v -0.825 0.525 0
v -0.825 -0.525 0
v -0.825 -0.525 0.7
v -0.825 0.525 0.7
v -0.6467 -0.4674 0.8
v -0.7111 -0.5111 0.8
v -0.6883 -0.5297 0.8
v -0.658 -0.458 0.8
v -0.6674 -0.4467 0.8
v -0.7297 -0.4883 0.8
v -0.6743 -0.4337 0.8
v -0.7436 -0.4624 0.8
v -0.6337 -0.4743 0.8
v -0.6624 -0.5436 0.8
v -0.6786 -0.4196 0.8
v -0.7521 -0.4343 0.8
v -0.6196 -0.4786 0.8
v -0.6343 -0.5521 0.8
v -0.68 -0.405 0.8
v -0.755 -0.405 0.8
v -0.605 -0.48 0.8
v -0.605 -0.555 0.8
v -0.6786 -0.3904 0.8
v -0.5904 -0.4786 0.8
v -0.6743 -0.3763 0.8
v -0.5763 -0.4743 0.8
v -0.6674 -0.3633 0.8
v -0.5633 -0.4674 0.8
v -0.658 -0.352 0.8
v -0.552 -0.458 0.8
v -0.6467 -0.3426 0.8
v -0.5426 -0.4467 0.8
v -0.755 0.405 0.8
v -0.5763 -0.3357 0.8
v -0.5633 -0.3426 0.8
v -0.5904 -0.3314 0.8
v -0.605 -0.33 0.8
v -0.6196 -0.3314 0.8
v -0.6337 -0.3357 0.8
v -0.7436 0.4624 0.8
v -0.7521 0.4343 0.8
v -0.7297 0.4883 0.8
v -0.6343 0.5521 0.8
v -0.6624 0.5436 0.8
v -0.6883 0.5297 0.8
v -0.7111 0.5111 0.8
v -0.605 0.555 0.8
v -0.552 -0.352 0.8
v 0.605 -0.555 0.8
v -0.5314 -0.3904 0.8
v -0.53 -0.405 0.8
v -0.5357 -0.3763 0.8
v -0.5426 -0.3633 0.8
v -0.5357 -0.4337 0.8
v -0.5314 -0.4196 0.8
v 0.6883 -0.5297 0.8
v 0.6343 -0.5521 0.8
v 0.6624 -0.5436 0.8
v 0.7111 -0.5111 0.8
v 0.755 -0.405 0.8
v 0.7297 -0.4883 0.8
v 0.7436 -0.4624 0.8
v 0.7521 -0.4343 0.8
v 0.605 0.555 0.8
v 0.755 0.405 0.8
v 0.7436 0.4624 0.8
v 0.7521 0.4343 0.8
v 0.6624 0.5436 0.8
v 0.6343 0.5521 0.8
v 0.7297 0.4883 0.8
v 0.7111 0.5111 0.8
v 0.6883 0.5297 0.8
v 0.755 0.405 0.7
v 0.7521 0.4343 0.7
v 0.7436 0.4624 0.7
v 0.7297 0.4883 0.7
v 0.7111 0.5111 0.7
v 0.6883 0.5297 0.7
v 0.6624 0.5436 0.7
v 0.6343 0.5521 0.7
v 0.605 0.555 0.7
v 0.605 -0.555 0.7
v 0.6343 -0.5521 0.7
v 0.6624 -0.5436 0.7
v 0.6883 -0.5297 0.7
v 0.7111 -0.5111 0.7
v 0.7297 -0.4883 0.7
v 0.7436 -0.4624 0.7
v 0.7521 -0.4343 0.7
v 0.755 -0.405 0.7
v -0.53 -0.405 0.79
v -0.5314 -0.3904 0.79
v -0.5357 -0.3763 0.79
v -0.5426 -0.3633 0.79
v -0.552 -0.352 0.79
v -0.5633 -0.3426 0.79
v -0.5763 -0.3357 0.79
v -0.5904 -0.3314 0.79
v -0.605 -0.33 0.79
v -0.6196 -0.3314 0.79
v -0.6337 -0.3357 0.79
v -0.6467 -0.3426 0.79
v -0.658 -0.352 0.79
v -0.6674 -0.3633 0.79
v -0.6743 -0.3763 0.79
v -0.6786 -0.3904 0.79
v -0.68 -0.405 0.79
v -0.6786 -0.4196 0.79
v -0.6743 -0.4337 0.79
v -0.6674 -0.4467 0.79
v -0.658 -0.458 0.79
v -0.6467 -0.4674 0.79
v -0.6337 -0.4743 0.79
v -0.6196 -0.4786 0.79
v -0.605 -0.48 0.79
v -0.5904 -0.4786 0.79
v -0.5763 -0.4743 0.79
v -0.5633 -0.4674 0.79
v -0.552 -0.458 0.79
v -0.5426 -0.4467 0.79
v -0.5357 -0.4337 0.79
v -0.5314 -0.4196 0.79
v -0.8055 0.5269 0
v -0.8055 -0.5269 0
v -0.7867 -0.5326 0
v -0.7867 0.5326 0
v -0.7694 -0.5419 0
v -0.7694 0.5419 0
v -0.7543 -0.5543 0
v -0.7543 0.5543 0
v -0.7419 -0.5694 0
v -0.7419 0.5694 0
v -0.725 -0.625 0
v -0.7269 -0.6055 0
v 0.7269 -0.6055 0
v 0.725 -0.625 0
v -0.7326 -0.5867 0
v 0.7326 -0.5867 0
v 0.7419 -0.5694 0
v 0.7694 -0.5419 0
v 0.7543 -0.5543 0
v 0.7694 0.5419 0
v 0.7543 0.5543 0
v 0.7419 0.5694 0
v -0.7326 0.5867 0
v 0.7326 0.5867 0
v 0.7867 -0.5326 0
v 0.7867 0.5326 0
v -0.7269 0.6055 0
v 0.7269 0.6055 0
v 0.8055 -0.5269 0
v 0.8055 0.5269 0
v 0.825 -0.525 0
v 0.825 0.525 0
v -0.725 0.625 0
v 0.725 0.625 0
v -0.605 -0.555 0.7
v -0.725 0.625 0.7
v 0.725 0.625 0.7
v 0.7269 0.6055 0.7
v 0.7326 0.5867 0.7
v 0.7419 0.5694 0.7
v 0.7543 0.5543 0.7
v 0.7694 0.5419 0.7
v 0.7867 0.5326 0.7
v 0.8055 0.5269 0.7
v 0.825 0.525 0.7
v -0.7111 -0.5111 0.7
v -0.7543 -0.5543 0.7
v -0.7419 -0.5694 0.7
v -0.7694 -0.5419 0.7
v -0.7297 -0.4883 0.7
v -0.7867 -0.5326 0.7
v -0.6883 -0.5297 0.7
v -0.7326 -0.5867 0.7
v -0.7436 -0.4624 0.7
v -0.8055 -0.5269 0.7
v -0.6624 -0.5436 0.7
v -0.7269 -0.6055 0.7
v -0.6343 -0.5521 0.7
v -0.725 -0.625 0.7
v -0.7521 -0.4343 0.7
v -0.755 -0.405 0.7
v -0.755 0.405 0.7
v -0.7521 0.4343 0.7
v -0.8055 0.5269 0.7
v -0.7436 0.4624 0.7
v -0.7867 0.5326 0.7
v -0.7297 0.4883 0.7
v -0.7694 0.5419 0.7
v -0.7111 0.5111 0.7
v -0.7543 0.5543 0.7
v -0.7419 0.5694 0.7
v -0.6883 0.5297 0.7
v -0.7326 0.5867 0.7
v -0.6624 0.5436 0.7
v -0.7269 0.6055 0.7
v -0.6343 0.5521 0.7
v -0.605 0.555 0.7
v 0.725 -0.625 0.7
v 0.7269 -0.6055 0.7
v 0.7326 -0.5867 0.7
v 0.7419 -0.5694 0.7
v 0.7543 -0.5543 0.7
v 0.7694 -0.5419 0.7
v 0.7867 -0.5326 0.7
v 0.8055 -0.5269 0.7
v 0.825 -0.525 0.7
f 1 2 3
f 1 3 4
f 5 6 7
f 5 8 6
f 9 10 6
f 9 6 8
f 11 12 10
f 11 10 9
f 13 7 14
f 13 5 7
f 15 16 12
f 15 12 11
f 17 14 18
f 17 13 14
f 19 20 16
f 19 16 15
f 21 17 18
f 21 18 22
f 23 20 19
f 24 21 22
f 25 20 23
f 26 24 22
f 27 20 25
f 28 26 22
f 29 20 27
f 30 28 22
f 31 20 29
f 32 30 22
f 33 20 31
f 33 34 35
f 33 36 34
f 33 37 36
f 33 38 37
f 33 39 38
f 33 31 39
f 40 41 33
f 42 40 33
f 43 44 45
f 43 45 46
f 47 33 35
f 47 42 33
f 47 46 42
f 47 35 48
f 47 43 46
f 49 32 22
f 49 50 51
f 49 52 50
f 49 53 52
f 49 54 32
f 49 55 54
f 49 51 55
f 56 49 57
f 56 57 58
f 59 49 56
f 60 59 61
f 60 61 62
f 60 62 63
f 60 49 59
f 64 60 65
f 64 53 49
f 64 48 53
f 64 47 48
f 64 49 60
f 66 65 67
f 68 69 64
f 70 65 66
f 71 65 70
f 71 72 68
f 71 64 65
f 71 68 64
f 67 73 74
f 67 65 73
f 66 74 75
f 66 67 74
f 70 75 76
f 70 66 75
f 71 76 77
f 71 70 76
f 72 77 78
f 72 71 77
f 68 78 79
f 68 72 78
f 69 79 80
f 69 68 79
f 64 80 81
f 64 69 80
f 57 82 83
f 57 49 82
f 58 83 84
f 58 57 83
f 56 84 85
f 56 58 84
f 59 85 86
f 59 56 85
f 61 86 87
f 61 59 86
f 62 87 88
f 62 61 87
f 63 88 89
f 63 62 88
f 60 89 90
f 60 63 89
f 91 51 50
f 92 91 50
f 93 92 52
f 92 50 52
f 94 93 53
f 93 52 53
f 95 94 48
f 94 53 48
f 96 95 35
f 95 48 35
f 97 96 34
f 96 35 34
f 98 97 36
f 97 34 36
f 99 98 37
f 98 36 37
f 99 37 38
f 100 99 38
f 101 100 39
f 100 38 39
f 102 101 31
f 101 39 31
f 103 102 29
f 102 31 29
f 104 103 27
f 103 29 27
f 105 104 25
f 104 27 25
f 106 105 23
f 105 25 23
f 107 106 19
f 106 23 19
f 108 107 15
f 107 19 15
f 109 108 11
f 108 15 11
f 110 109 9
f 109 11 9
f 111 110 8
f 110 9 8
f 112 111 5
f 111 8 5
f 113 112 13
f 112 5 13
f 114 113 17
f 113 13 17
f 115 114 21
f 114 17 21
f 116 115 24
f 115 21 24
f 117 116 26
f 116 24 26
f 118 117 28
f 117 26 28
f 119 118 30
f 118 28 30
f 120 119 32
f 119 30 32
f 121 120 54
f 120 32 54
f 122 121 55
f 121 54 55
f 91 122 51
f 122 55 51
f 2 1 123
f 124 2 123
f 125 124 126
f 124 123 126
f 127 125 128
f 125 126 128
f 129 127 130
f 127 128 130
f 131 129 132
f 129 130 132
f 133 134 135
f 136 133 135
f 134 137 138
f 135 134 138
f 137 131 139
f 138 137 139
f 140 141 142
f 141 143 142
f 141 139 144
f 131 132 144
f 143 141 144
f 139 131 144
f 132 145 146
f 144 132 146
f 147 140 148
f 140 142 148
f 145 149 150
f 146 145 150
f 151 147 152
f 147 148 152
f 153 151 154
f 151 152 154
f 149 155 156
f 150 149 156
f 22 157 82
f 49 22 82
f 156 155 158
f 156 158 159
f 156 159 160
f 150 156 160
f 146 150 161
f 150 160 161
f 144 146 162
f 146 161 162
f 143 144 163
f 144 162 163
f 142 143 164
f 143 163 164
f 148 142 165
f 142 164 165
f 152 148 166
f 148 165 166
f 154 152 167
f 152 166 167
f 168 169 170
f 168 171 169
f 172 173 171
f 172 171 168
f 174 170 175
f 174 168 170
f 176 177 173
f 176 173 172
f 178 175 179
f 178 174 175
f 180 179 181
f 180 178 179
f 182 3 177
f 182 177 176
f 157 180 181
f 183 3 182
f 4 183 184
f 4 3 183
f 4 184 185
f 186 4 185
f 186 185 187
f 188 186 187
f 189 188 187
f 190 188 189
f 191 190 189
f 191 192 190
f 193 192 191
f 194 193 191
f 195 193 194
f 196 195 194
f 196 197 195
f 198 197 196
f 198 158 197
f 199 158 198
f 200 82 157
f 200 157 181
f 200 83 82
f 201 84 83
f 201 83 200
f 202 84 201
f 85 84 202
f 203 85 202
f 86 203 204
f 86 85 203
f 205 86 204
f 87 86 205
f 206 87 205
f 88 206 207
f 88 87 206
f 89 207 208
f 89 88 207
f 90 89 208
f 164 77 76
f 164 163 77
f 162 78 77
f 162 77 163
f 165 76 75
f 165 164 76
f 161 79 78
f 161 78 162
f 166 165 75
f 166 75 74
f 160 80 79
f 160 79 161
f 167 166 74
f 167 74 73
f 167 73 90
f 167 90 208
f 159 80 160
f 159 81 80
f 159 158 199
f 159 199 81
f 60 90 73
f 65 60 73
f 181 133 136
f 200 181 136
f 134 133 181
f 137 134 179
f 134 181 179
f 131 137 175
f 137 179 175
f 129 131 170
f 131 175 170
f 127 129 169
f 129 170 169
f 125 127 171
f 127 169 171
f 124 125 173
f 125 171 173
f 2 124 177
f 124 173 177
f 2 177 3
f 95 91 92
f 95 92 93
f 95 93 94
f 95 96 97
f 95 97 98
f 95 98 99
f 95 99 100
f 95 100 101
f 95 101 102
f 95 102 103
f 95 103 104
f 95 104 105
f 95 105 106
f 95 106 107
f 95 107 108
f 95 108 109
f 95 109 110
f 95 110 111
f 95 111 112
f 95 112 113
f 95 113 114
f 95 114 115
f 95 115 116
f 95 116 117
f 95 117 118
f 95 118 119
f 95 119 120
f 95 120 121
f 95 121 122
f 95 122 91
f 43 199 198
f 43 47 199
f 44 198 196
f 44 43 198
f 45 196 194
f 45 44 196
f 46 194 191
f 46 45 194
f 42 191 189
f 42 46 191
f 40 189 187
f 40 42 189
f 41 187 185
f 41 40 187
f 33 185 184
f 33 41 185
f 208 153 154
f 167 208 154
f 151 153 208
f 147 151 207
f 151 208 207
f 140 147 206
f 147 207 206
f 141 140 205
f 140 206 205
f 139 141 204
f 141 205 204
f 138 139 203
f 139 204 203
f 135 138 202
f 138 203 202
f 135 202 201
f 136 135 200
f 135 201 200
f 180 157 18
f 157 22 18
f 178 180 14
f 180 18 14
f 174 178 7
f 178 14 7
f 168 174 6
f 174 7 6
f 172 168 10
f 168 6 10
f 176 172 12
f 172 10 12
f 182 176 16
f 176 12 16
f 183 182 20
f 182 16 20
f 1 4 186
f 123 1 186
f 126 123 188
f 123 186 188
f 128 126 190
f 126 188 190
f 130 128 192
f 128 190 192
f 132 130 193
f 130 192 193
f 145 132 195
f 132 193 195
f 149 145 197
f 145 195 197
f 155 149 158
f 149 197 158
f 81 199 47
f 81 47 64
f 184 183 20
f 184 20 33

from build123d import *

# Parameters (mm, degrees)
SKETCH1_W           = 1.65
SKETCH1_H           = 1.25
BOSS_EXTRUDE1_DEPTH = 0.7
SKETCH2_W           = 1.51
SKETCH2_H           = 1.11
BOSS_EXTRUDE2_DEPTH = 0.1
FILLET1_R           = 0.15
SKETCH3_R           = 0.1
CUT_EXTRUDE1_DEPTH  = 2.2494999
SKETCH4_R           = 0.075
CUT_EXTRUDE2_DEPTH  = 0.01


with BuildPart() as part:
    # Sketch1 → Boss-Extrude1 (new body)
    with BuildSketch(Plane.XY):
        Rectangle(SKETCH1_W, SKETCH1_H)
    extrude(amount=BOSS_EXTRUDE1_DEPTH)

    # Sketch2 → Boss-Extrude2 (add)
    with BuildSketch(Plane.XY.offset(0.7)):
        Rectangle(SKETCH2_W, SKETCH2_H)
    extrude(amount=BOSS_EXTRUDE2_DEPTH)

    # Fillet1
    fillet1_edges = [part.edges().sort_by_distance(p)[0] for p in [
        (0.755, -0.555, 0.75),
        (0.755, 0.555, 0.75),
        (-0.755, 0.555, 0.75),
        (-0.755, -0.555, 0.75),
    ]]
    fillet(fillet1_edges, radius=FILLET1_R)

    # Sketch3 → Cut-Extrude1 (cut, through all)
    with BuildSketch(Plane.XY.offset(0.7)):
        with Locations((-0.825, 0.625)):
            Circle(SKETCH3_R)
        with Locations((0.825, 0.625)):
            Circle(SKETCH3_R)
        with Locations((0.825, -0.625)):
            Circle(SKETCH3_R)
        with Locations((-0.825, -0.625)):
            Circle(SKETCH3_R)
    extrude(amount=-CUT_EXTRUDE1_DEPTH, mode=Mode.SUBTRACT)

    # Sketch4 → Cut-Extrude2 (cut)
    with BuildSketch(Plane.XY.offset(0.8)):
        with Locations((-0.605, -0.405)):
            Circle(SKETCH4_R)
    extrude(amount=-CUT_EXTRUDE2_DEPTH, mode=Mode.SUBTRACT)


solid = part.part
